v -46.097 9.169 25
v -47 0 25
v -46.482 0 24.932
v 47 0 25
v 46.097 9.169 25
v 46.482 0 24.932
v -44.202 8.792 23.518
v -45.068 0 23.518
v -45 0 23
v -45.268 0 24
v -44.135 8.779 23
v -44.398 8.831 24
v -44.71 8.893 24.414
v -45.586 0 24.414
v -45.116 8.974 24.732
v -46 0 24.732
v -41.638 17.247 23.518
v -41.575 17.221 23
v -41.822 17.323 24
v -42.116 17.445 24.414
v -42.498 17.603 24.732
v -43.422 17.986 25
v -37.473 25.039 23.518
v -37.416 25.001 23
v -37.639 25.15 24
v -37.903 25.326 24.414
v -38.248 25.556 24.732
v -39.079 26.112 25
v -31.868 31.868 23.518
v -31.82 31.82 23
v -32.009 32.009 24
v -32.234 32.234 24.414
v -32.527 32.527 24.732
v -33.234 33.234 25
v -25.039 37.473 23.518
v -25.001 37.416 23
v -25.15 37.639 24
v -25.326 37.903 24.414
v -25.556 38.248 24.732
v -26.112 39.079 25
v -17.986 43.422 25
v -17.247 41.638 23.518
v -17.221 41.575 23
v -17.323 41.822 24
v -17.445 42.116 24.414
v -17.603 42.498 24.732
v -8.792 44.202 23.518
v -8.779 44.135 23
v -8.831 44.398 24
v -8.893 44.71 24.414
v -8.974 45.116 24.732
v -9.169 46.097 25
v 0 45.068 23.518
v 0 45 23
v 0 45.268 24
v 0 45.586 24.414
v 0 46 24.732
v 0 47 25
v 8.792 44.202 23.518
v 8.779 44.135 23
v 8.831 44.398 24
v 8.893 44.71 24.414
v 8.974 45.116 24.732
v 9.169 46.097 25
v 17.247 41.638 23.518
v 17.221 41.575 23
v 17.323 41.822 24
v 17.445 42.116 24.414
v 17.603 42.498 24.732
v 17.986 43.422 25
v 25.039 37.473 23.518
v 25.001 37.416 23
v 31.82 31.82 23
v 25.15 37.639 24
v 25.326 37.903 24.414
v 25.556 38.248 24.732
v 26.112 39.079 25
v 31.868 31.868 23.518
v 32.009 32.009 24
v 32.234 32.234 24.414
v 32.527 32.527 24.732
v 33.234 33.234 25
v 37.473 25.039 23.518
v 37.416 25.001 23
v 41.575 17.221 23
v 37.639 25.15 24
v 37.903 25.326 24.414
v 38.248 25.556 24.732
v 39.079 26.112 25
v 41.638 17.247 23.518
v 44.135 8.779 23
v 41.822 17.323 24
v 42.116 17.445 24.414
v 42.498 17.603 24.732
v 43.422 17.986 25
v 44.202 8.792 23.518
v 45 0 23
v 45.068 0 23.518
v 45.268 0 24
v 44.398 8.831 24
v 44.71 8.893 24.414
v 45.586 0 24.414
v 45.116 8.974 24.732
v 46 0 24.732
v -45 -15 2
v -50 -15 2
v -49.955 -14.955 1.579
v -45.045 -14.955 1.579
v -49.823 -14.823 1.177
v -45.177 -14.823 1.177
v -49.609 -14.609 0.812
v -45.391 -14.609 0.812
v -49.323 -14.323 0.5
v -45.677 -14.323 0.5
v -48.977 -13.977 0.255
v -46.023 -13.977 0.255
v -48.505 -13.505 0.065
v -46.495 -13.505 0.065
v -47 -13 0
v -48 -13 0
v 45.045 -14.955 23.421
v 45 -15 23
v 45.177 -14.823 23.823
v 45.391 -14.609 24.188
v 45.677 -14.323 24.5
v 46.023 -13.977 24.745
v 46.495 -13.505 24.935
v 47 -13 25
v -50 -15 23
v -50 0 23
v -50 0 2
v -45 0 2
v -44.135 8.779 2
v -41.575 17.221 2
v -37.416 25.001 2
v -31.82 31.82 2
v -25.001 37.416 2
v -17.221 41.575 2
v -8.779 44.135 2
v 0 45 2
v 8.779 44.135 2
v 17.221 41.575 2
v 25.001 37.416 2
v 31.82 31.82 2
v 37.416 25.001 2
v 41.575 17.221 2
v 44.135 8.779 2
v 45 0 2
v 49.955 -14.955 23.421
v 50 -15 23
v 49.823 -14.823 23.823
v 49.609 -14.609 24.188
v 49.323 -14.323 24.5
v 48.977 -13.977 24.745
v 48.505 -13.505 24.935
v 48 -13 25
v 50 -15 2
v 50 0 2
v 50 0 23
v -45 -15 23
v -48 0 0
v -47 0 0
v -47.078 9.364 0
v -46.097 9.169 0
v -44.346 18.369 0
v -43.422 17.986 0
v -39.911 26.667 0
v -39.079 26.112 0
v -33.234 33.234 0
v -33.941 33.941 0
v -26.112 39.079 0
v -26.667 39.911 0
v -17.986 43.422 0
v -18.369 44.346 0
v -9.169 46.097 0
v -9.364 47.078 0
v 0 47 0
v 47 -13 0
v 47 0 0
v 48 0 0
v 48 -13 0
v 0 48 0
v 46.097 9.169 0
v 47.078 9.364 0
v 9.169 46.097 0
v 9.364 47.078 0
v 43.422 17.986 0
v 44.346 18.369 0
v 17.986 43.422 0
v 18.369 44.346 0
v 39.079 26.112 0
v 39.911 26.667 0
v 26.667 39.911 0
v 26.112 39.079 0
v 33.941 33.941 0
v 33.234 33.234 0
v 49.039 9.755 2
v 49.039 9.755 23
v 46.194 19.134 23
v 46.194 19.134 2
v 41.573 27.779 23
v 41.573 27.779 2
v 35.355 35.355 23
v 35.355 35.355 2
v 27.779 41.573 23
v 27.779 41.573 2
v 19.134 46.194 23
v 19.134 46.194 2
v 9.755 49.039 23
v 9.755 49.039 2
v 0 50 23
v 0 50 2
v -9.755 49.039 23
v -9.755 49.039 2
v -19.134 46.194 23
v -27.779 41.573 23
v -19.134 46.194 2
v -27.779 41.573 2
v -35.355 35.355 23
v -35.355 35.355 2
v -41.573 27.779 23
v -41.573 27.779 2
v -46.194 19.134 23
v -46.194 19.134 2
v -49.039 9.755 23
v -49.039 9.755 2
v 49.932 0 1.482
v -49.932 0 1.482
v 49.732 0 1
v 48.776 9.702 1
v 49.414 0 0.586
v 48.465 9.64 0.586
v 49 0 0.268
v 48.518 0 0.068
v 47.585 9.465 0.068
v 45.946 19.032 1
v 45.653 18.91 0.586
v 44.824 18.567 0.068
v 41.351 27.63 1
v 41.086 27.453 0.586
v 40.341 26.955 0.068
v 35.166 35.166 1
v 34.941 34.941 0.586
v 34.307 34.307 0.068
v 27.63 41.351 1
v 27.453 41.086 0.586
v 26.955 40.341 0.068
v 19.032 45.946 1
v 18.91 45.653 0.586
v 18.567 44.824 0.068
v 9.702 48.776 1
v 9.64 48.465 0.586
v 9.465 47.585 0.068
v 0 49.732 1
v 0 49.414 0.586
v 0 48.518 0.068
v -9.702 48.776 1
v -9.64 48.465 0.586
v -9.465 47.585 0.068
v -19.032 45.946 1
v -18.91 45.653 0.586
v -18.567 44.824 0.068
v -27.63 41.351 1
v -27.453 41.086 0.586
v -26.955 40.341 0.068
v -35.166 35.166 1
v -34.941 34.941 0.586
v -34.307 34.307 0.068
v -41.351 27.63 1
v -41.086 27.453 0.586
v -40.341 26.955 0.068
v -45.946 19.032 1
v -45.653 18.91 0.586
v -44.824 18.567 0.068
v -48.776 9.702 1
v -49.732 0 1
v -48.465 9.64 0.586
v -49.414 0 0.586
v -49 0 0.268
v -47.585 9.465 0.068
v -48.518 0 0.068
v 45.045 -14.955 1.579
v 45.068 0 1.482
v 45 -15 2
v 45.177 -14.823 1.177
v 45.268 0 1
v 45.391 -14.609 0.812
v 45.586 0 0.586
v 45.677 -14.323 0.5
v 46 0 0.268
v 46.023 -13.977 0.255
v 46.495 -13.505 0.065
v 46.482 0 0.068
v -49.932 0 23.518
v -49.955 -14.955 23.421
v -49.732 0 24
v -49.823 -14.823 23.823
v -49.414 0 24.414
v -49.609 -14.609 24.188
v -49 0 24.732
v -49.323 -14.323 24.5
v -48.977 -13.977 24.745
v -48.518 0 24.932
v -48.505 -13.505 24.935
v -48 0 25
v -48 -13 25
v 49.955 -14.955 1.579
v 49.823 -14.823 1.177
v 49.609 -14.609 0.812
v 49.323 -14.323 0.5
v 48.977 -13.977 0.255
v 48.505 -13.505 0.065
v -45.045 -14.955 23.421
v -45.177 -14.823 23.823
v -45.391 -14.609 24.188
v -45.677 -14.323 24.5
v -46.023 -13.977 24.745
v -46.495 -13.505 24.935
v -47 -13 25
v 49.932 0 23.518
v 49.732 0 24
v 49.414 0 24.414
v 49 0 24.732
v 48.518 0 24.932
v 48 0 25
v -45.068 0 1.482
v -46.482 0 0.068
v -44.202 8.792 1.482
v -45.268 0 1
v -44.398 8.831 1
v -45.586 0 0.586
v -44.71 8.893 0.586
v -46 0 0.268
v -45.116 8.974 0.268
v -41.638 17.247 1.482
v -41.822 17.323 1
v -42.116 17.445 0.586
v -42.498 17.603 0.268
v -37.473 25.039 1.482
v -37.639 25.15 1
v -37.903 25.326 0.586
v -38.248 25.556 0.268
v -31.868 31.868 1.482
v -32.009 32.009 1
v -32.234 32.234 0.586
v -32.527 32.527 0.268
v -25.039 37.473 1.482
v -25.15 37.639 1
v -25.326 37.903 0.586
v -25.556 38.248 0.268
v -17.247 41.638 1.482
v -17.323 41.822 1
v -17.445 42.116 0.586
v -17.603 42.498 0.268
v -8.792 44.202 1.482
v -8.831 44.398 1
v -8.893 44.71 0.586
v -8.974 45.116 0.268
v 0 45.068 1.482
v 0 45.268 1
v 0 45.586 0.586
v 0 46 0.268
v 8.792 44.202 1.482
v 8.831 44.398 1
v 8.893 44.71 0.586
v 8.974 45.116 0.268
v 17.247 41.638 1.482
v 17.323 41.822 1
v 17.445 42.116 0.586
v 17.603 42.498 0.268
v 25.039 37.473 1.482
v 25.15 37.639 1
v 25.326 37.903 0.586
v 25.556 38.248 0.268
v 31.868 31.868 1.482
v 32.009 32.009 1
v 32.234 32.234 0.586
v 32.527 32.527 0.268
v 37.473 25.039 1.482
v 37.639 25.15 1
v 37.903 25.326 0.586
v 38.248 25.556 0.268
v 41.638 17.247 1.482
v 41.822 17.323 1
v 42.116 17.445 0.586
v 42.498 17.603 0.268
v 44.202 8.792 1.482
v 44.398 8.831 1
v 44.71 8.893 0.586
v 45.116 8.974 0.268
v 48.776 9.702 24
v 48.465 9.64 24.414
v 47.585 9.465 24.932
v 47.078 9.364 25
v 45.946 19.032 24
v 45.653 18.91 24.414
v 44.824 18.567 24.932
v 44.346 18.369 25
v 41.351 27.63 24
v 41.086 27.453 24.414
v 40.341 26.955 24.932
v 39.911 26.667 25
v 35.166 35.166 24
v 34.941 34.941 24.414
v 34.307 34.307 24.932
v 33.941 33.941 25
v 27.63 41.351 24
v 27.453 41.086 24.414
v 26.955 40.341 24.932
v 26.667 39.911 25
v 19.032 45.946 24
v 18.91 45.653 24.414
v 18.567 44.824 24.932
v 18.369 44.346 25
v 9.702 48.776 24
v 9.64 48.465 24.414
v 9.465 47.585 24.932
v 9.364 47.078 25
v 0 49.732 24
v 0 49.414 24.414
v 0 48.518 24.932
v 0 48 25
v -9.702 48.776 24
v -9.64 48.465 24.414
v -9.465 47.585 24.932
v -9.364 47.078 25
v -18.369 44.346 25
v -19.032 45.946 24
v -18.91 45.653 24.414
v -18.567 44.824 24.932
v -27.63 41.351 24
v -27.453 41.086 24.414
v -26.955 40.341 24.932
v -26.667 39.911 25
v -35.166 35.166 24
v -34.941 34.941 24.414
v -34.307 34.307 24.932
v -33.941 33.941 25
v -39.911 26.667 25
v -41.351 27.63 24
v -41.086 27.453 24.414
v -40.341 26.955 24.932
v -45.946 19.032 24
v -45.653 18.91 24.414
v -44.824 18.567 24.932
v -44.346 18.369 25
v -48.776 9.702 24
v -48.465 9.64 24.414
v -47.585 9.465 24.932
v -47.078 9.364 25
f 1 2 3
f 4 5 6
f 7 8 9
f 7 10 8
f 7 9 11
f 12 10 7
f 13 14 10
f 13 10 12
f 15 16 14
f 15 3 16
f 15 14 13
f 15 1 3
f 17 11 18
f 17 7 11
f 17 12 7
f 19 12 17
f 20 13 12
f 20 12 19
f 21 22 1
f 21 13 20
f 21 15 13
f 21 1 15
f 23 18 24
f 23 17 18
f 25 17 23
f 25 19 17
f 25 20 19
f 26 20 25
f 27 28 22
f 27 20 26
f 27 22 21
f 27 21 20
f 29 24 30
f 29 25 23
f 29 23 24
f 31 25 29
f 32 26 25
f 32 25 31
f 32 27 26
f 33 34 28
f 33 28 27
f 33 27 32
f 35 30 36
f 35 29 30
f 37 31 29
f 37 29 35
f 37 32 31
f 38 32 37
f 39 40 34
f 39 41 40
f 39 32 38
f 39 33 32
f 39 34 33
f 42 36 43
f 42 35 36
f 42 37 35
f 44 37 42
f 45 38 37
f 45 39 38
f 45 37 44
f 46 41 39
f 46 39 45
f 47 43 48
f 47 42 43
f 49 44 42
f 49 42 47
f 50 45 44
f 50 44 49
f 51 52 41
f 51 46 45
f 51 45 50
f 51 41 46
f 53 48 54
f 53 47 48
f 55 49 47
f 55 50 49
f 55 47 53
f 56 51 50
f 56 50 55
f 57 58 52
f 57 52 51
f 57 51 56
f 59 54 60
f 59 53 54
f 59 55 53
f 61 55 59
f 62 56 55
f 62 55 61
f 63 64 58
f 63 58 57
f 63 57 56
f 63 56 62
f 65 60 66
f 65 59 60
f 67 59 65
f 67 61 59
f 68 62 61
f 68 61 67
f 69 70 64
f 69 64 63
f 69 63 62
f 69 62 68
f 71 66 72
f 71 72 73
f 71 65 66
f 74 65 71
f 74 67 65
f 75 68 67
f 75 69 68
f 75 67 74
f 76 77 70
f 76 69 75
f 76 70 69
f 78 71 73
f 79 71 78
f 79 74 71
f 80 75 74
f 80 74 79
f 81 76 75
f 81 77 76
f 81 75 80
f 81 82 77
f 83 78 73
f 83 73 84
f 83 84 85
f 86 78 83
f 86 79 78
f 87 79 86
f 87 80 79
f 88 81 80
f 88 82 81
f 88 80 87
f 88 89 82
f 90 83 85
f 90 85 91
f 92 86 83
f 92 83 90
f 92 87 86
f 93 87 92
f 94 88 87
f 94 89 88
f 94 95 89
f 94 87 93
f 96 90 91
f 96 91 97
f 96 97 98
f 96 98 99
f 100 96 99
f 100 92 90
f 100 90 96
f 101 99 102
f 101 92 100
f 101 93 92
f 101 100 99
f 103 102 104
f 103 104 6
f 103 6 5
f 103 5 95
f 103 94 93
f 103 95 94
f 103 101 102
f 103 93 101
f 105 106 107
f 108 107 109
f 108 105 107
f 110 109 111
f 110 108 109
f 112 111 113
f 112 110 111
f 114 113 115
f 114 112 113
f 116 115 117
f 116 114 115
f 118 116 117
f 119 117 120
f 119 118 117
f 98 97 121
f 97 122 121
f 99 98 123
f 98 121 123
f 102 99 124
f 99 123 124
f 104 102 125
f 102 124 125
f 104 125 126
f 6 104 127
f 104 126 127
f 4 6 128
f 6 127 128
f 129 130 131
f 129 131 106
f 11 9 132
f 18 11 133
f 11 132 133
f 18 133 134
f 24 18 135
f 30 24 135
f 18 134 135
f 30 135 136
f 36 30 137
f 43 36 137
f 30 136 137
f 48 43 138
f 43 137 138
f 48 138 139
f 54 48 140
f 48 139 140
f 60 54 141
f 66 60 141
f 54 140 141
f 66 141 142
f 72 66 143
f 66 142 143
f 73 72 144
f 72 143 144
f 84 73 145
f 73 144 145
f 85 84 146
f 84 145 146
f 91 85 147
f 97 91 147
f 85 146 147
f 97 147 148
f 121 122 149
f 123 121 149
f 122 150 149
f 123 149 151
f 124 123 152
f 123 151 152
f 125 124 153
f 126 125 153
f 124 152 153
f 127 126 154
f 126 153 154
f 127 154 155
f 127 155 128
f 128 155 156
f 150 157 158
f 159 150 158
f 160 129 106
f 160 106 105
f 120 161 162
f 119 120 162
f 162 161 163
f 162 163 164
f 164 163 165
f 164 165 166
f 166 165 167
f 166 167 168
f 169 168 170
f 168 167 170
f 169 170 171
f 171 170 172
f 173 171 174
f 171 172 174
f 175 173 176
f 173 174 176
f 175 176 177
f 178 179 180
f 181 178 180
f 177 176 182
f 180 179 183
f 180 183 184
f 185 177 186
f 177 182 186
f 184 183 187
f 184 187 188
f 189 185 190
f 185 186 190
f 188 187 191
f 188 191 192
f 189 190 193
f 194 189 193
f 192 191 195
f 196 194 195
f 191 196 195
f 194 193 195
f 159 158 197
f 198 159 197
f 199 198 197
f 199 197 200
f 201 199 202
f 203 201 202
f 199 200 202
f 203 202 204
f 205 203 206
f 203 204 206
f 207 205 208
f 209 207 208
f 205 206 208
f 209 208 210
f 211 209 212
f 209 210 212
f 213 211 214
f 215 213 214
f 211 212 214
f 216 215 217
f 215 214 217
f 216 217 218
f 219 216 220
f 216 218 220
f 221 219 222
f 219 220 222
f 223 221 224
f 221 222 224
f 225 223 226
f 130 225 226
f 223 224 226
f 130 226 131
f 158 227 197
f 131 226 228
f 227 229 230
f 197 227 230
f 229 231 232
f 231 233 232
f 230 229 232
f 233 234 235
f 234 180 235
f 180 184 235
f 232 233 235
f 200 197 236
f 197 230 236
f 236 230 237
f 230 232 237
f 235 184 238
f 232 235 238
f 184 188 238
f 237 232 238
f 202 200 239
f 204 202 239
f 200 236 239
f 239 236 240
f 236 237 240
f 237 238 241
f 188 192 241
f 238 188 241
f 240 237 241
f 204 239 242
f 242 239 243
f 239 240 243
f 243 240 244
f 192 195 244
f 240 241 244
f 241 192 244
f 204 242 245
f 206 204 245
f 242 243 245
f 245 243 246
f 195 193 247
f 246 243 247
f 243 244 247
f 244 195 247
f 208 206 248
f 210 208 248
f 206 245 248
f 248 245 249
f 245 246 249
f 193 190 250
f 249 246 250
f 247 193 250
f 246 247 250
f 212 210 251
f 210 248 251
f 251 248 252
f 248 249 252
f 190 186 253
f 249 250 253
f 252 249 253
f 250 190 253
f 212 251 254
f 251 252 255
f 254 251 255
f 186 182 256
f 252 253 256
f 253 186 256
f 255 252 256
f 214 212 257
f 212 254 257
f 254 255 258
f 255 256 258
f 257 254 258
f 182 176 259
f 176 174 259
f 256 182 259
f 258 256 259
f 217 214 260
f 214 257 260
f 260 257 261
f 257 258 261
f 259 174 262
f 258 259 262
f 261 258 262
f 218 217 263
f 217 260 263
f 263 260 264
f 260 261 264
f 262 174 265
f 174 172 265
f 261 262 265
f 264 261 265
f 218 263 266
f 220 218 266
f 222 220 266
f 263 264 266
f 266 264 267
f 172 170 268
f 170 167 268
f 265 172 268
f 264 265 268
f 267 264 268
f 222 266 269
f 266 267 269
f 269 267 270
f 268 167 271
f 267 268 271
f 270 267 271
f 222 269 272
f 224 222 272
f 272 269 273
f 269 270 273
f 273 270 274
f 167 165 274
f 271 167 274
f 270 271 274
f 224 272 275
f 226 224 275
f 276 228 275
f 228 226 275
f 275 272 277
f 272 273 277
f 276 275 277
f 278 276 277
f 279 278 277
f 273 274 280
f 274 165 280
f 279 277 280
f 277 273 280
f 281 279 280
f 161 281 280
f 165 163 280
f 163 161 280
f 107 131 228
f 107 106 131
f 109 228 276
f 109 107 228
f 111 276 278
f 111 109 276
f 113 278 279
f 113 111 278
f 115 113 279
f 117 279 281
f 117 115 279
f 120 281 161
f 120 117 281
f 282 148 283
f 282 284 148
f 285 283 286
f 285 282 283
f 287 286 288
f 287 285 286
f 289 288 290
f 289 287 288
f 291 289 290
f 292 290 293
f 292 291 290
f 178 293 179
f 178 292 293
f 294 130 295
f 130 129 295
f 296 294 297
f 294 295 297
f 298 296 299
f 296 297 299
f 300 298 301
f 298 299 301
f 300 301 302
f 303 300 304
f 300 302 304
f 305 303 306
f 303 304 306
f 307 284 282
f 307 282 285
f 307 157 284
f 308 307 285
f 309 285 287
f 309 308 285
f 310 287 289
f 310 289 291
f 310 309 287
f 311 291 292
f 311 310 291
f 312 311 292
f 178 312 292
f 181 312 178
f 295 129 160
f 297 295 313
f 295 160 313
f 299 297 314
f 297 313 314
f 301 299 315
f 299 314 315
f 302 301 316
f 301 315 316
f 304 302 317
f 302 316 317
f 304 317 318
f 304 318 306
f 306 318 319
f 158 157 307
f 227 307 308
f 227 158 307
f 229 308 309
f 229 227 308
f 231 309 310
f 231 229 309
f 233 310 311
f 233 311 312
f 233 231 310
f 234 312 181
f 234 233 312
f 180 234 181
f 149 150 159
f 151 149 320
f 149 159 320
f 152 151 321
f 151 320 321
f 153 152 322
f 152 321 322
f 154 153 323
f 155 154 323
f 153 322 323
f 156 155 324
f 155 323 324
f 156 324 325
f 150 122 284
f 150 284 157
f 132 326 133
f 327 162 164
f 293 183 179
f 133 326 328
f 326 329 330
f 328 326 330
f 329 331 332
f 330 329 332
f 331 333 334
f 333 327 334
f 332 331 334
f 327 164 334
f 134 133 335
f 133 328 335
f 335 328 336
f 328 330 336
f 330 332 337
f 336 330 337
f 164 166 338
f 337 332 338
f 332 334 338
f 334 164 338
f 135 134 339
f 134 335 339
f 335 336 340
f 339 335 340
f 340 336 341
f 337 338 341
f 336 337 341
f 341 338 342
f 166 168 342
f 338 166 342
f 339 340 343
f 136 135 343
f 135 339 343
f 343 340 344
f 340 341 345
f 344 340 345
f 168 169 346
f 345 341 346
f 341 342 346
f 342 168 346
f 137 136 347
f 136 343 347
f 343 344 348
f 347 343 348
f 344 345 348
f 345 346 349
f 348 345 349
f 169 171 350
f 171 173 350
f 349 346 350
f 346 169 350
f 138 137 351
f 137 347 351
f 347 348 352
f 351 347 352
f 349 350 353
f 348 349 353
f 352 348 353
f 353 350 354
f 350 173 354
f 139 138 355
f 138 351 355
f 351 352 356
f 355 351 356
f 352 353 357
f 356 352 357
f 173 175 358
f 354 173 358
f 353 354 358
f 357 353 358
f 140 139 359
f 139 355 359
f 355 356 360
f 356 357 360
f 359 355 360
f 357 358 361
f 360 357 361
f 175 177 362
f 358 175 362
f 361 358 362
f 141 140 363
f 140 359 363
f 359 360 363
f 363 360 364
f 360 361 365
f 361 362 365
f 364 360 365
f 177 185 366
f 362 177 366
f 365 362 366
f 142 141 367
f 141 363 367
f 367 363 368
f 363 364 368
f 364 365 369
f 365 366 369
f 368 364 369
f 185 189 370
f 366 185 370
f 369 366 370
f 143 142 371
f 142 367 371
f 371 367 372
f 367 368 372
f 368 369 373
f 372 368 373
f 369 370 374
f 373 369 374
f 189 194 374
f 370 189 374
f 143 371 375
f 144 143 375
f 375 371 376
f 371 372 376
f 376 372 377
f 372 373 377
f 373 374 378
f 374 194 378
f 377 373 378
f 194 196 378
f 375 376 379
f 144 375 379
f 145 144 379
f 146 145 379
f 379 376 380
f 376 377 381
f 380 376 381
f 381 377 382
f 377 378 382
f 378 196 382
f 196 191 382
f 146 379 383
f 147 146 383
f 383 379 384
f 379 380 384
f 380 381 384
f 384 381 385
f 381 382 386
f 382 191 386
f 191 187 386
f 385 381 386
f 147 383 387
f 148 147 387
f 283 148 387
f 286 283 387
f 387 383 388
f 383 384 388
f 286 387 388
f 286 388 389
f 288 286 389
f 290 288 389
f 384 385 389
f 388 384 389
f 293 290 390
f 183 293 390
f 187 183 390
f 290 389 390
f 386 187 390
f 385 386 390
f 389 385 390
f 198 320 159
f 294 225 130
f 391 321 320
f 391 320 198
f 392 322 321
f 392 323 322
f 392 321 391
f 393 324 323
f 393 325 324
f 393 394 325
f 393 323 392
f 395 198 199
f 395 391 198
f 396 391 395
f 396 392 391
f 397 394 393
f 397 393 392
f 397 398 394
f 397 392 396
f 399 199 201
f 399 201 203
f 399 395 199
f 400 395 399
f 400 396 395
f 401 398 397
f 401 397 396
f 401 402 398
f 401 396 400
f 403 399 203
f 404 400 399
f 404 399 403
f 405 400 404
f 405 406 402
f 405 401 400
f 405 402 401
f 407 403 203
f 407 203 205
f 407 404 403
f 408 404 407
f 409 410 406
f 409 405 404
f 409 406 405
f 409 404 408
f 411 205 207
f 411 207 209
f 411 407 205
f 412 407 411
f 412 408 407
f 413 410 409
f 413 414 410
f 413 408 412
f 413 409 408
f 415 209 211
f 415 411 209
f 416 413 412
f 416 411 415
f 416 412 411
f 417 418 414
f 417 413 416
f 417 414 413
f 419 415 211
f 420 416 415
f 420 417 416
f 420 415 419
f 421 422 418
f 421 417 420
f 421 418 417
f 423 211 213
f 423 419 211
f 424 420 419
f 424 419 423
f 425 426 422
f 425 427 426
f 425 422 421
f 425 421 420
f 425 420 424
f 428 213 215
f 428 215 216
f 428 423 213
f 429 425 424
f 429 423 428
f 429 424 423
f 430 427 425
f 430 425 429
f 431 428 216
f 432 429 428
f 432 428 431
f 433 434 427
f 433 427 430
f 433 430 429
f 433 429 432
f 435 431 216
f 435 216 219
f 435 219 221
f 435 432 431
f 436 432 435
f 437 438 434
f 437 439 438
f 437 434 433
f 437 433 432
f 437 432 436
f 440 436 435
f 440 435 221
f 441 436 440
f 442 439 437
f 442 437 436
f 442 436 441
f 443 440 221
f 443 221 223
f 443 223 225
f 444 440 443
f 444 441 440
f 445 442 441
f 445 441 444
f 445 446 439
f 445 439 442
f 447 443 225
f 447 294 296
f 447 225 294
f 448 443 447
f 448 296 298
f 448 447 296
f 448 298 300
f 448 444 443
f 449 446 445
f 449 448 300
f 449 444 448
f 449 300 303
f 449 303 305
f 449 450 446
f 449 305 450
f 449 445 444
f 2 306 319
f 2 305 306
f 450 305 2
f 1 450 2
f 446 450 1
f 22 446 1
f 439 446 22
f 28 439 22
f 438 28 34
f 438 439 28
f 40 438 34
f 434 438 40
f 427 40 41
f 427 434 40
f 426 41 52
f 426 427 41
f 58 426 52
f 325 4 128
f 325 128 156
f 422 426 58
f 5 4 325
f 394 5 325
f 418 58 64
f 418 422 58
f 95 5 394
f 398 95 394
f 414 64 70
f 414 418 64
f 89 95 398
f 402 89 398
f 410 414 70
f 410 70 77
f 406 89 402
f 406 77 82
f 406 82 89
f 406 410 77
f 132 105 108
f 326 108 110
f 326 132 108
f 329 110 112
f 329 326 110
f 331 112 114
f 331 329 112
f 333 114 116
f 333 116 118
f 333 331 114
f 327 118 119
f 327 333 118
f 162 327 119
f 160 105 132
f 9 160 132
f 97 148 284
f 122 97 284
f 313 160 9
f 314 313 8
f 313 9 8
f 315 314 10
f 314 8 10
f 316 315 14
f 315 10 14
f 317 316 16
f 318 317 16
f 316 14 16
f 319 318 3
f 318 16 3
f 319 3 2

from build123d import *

# Parameters (mm, degrees)
BOSS_EXTRUDE1_DEPTH = 25
FILLET1_R           = 2


with BuildPart() as part:
    # Sketch1 → Boss-Extrude1 (new body)
    with BuildSketch(Plane.XY):
        with BuildLine():
            Line((-50, 0), (-50, -15))
            Line((-50, -15), (-45, -15))
            Line((-45, -15), (-45, 0))
            ThreePointArc((-45, 0), (0, 45), (45, 0))
            Line((45, 0), (45, -15))
            Line((45, -15), (50, -15))
            Line((50, -15), (50, 0))
            ThreePointArc((50, 0), (0, 50), (-50, 0))
        make_face()
    extrude(amount=BOSS_EXTRUDE1_DEPTH)

    # Fillet1
    fillet1_edges = [part.edges().sort_by_distance(p)[0] for p in [
        (-45, -7.5, 0),
        (-47.5, -15, 0),
        (-50, -7.5, 0),
        (0, 50, 0),
        (-47.5, -15, 25),
        (-45, -7.5, 25),
        (0, 45, 25),
        (45, -7.5, 25),
        (47.5, -15, 25),
        (50, -7.5, 25),
        (0, 50, 25),
        (50, -7.5, 0),
        (-50, -7.5, 25),
        (47.5, -15, 0),
        (45, -7.5, 0),
        (0, 45, 0),
    ]]
    fillet(fillet1_edges, radius=FILLET1_R)


solid = part.part
